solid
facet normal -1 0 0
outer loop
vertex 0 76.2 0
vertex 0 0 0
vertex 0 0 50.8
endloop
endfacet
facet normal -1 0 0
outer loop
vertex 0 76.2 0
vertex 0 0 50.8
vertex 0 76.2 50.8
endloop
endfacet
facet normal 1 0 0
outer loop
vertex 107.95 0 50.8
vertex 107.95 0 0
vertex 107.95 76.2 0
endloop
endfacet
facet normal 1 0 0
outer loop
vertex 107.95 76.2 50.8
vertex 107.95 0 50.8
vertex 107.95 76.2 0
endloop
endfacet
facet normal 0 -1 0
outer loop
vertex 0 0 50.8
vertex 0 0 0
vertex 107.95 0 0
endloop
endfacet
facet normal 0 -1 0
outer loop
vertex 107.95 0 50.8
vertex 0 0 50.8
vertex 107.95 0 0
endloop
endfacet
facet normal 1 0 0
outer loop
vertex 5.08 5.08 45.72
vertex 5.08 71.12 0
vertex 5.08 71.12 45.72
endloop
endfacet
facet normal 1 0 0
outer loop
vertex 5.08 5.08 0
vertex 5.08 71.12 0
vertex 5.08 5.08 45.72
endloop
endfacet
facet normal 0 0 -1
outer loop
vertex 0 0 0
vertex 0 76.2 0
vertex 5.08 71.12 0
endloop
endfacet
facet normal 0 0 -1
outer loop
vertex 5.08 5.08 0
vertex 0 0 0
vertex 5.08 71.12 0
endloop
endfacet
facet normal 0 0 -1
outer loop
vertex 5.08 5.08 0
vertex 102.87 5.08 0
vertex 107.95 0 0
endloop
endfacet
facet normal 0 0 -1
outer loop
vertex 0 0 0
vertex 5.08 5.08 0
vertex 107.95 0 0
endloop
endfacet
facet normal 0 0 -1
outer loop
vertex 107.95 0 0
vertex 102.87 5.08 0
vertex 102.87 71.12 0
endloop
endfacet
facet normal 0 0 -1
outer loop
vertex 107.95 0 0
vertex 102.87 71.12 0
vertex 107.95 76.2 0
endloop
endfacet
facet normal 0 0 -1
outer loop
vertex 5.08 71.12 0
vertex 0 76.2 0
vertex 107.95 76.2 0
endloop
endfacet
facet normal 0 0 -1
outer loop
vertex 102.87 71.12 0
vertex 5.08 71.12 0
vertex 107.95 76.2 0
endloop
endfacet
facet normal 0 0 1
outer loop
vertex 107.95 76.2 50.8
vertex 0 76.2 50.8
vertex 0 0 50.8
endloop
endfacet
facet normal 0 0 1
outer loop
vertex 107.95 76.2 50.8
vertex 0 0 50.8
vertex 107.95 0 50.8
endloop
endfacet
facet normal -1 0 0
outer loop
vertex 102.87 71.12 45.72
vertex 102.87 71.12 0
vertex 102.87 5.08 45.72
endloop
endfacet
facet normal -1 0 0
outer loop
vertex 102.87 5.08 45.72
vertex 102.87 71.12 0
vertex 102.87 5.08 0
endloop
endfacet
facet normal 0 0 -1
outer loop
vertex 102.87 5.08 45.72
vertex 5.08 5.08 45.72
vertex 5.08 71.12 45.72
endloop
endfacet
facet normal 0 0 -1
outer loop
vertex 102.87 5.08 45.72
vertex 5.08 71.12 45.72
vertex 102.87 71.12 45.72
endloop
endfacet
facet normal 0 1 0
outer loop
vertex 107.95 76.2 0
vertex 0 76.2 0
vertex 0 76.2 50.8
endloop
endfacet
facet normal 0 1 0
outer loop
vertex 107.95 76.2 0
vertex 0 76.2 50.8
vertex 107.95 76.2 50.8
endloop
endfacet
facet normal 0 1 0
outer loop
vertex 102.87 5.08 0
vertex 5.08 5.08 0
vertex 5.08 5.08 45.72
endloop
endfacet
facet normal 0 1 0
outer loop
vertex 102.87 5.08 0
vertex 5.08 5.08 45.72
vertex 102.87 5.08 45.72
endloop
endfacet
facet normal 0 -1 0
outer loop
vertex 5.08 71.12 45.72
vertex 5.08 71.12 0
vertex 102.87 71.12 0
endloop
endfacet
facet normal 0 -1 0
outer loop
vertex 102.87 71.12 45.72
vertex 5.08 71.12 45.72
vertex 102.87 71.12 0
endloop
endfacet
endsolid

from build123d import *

# Parameters (mm, degrees)
F0_W     = 107.95
F0_H     = 76.2
F0_W_2   = 97.79
F0_H_2   = 66.04
F1_DEPTH = 50.8
F2_W     = 97.79
F2_H     = 66.04
F3_DEPTH = 45.72


with BuildPart() as f1:
    # F0 (on Top) → F1 (new body)
    with BuildSketch(Plane.XY):
        with Locations((53.975, 38.1)):
            Rectangle(F0_W, F0_H)
        with Locations((53.975, 38.1)):
            Rectangle(F0_W_2, F0_H_2, mode=Mode.SUBTRACT)
        with Locations((53.975, 38.1)):
            Rectangle(F0_W_2, F0_H_2)
    extrude(amount=F1_DEPTH)

    # F2 (on face) → F3 (cut)
    with BuildSketch(Plane(origin=(0, 0, 0), x_dir=(1, 0, 0), z_dir=(0, 0, -1))):
        with Locations((53.975, -38.1)):
            Rectangle(F2_W, F2_H)
    extrude(amount=-F3_DEPTH, mode=Mode.SUBTRACT)


solid = f1.part
